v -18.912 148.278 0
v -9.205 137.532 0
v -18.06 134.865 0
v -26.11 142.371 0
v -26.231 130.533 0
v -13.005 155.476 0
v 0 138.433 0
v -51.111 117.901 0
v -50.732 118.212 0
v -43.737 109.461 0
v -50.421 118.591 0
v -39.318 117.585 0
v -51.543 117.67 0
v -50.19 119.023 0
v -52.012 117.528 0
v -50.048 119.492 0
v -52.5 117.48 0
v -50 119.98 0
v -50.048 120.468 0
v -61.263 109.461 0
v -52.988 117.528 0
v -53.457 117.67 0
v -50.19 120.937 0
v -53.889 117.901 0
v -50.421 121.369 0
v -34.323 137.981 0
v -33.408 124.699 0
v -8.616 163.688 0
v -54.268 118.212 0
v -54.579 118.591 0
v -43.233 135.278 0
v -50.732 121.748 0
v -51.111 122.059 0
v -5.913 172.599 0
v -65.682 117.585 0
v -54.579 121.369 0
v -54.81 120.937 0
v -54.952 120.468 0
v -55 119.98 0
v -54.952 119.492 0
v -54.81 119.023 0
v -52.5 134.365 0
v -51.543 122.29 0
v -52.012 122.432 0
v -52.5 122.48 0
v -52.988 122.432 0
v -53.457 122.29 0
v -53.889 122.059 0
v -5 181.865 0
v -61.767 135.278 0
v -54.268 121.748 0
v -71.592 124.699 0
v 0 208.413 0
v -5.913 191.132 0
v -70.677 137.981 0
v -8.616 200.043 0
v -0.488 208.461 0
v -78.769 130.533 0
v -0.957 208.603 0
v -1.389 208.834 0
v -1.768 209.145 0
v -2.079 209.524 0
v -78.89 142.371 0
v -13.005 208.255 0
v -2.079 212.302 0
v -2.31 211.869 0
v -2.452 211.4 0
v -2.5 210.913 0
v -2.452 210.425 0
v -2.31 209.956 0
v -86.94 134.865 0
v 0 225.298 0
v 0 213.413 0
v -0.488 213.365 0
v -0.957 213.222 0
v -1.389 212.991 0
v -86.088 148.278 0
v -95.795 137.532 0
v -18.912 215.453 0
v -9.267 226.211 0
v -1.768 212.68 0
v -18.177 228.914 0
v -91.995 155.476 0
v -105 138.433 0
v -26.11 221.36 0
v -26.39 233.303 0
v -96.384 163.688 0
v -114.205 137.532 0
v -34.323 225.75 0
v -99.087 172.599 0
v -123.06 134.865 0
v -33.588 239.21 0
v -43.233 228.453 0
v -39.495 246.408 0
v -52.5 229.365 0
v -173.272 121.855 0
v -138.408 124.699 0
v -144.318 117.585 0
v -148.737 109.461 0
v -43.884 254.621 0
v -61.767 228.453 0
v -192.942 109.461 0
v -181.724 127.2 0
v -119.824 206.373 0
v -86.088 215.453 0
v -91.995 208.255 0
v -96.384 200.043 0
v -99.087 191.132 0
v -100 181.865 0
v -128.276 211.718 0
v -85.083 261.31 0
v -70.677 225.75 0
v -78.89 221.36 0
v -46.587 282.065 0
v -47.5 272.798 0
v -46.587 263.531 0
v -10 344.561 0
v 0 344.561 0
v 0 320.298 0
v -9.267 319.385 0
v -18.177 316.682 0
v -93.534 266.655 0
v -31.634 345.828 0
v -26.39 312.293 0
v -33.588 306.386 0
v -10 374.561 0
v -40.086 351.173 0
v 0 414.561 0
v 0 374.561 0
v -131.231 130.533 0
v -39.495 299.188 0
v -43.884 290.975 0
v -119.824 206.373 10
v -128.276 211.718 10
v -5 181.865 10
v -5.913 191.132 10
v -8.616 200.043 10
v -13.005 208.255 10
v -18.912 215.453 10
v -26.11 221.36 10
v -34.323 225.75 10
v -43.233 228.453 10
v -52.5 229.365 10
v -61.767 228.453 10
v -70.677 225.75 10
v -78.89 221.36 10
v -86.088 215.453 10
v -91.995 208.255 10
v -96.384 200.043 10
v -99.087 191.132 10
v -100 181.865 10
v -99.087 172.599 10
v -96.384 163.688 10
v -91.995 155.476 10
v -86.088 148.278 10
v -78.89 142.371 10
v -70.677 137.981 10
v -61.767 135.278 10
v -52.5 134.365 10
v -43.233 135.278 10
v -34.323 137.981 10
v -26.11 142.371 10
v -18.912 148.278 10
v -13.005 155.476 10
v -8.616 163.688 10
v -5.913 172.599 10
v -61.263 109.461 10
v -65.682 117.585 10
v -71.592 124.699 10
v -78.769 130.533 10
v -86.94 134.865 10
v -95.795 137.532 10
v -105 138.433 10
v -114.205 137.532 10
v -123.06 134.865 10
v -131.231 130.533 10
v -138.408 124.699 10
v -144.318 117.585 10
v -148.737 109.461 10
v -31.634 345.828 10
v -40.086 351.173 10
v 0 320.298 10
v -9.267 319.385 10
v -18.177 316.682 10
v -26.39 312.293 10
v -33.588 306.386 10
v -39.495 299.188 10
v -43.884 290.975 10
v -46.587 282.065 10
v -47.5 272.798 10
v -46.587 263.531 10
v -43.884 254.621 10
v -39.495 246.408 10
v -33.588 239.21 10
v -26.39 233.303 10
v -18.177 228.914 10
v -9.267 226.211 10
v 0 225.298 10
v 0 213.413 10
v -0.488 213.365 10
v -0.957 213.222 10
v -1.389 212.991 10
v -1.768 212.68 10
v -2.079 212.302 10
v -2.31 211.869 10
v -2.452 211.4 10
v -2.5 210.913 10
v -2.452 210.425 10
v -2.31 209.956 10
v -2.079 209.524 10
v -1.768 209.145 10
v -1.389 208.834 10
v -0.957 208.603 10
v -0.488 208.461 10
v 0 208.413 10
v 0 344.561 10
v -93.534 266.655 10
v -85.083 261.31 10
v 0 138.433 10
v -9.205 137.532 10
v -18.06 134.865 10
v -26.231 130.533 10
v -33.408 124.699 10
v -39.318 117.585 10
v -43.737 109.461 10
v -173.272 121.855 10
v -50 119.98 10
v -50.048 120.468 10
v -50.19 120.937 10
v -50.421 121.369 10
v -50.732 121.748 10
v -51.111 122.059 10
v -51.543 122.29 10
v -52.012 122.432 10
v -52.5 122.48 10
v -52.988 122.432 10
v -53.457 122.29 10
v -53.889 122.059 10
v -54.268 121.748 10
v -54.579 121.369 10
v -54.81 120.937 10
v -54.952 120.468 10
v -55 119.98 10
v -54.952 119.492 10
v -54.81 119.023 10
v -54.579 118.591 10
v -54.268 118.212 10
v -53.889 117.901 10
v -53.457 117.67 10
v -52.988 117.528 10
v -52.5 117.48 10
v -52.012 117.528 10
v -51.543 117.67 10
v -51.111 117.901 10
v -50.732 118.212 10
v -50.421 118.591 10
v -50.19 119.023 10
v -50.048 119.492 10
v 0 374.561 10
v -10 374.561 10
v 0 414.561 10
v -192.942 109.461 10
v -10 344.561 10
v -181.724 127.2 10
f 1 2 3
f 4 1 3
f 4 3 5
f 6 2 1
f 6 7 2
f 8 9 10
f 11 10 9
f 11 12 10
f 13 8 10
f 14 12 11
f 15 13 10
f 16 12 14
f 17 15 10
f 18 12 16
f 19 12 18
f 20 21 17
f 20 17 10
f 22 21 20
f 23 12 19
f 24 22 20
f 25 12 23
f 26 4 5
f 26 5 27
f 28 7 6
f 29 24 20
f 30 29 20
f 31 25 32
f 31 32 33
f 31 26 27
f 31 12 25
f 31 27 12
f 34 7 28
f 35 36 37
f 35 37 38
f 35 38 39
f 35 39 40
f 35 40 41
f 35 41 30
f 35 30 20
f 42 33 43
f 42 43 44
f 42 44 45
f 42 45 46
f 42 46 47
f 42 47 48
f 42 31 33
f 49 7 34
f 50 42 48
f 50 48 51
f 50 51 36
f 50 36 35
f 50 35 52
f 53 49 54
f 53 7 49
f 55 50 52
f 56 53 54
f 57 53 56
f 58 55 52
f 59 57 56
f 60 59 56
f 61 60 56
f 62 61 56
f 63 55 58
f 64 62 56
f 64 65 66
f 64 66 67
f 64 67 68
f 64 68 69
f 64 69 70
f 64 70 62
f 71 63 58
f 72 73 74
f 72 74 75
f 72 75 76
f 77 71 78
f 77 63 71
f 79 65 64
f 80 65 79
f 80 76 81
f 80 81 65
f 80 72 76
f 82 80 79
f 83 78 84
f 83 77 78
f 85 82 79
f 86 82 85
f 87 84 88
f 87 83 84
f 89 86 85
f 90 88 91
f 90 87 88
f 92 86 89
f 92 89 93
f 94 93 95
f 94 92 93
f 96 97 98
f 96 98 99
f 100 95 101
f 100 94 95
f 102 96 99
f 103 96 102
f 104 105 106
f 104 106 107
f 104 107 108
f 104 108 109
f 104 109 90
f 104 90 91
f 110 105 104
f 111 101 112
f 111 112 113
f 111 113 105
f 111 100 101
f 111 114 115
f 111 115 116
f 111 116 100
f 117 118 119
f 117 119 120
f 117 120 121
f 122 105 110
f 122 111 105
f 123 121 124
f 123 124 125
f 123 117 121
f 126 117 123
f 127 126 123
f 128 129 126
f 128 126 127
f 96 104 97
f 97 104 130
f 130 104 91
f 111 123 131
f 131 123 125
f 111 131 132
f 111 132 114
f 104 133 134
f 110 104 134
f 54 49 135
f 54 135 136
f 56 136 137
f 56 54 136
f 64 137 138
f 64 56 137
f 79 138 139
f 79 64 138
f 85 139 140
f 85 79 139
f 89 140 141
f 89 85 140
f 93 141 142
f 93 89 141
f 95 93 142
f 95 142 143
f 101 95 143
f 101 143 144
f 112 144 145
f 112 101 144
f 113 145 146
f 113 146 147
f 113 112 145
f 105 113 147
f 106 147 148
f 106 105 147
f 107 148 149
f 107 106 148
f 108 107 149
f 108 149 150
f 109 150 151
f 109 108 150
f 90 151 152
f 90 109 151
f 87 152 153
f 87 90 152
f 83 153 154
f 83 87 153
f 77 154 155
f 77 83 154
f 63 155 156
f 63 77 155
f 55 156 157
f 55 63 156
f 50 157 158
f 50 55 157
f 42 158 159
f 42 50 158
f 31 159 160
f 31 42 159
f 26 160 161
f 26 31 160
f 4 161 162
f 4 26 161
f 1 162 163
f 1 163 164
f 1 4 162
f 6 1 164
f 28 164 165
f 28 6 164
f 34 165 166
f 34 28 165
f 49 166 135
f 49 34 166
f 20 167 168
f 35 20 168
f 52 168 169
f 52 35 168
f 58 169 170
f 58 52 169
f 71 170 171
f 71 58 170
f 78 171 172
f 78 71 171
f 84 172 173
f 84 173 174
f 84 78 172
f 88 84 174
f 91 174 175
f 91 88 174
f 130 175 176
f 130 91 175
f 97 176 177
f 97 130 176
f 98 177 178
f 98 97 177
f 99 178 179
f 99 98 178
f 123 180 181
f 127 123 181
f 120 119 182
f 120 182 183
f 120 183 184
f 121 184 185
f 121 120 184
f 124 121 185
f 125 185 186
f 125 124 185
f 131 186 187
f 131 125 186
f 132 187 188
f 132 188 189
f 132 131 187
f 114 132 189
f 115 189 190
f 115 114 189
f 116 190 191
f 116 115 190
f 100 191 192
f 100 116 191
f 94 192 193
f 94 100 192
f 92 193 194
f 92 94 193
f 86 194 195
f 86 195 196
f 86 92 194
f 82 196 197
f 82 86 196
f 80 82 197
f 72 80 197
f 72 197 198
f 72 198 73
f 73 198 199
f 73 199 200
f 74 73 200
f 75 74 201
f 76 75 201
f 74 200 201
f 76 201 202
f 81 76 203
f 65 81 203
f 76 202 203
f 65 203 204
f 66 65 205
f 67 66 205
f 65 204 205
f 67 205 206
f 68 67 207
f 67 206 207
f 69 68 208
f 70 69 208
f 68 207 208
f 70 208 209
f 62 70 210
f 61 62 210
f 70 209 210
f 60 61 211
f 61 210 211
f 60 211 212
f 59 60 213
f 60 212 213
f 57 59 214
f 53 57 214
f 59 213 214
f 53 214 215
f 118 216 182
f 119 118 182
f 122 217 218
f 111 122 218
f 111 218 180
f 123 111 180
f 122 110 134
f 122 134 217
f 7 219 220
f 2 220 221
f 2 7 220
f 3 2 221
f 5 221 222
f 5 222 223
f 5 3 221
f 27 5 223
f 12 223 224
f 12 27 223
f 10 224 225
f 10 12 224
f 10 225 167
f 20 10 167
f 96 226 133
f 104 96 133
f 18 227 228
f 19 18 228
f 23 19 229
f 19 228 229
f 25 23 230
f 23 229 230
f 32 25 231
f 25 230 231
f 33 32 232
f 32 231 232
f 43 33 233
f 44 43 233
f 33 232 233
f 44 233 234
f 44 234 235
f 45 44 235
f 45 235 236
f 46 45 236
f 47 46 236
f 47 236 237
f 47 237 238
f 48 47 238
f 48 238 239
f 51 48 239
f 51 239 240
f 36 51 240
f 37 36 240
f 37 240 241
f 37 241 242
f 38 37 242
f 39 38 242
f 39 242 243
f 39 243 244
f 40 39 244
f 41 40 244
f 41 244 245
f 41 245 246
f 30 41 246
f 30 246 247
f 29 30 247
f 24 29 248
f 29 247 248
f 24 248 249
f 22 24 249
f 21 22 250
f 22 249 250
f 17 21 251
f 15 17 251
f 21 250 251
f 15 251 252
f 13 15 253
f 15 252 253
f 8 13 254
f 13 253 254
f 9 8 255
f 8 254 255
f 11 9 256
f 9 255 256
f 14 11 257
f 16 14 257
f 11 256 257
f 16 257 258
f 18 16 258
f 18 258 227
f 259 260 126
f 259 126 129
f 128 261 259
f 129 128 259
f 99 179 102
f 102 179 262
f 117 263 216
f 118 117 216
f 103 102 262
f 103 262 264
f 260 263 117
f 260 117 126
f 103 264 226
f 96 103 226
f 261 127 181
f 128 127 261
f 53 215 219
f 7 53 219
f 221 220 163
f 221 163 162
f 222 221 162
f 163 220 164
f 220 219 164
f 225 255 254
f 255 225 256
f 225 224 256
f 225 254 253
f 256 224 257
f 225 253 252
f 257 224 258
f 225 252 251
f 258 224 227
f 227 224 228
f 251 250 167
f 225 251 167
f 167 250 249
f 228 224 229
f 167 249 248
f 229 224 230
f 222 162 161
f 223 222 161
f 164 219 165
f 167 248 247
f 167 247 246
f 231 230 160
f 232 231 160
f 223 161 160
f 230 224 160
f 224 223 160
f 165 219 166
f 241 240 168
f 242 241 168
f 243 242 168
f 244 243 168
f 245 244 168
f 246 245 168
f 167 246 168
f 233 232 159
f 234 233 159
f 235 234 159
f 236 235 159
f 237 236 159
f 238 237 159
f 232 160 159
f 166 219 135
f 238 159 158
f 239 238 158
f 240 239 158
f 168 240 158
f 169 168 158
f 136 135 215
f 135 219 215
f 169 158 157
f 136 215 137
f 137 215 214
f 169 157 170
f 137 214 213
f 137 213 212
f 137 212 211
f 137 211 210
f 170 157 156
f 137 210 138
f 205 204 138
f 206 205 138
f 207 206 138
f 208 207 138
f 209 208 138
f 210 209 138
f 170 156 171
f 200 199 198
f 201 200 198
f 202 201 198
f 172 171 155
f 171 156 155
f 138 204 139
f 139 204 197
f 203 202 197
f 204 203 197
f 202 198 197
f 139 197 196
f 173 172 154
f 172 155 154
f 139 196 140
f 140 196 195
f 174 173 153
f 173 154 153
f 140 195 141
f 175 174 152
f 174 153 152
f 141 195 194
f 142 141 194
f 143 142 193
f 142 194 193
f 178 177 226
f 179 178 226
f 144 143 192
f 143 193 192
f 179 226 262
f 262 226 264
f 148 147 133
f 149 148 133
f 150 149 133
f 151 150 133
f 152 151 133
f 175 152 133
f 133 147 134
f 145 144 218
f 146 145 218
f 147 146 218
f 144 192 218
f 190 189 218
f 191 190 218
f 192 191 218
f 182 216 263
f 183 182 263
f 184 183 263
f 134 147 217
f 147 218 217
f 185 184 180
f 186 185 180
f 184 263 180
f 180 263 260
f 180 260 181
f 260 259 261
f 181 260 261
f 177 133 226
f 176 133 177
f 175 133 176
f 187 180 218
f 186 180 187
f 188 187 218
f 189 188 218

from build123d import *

# Parameters (mm, degrees)
ESQUISSE1_R             = 47.5
BOSS_EXTRU_1_DEPTH      = 10
ESQUISSE3_W             = 100
ESQUISSE3_H             = 10
ENL_V_MAT_EXTRU_1_DEPTH = 11
ESQUISSE4_R             = 2.5
ENL_V_MAT_EXTRU_2_DEPTH = 11
ESQUISSE6_W             = 75
ESQUISSE6_H             = 120
BOSS_EXTRU_2_DEPTH      = 10
ESQUISSE7_W             = 10
ESQUISSE7_H             = 50
ESQUISSE7_W_2           = 30
ESQUISSE7_H_2           = 9.570800355
ENL_V_MAT_EXTRU_3_DEPTH = 10
ENL_V_MAT_EXTRU_6_DEPTH = 10
ESQUISSE12_W            = 10
ESQUISSE12_H            = 30
ENL_V_MAT_EXTRU_7_DEPTH = 10


with BuildPart() as part:
    # Esquisse1 → Boss.-Extru.1 (new body)
    with BuildSketch(Plane.XY):
        Polygon((-310, -75.642859016), (0, 414.561180135), (310, -75.642859016), align=None)
        with Locations((-157.5, 0)):
            Circle(ESQUISSE1_R, mode=Mode.SUBTRACT)
        with Locations((-52.5, 0)):
            Circle(ESQUISSE1_R, mode=Mode.SUBTRACT)
        with Locations((52.5, 0)):
            Circle(ESQUISSE1_R, mode=Mode.SUBTRACT)
        with Locations((157.5, 0)):
            Circle(ESQUISSE1_R, mode=Mode.SUBTRACT)
        with Locations((-105, 90.932667397)):
            Circle(ESQUISSE1_R, mode=Mode.SUBTRACT)
        with Locations((0, 90.932667397)):
            Circle(ESQUISSE1_R, mode=Mode.SUBTRACT)
        with Locations((105, 90.932667397)):
            Circle(ESQUISSE1_R, mode=Mode.SUBTRACT)
        with Locations((-52.5, 181.865334795)):
            Circle(ESQUISSE1_R, mode=Mode.SUBTRACT)
        with Locations((52.5, 181.865334795)):
            Circle(ESQUISSE1_R, mode=Mode.SUBTRACT)
        with Locations((0, 272.798002192)):
            Circle(ESQUISSE1_R, mode=Mode.SUBTRACT)
    extrude(amount=BOSS_EXTRU_1_DEPTH)

    # Esquisse3 → Enlèv. mat.-Extru.1 (cut, through all)
    with BuildSketch(Plane.XY.offset(10)):
        Polygon((-269.913793103, -12.254405678), (-261.461999325, -17.599233264), (-208.013723463, 66.918704521), (-216.465517241, 72.263532107), align=None)
        Polygon((-181.724137931, 127.200191667), (-173.272344153, 121.855364081), (-119.82406829, 206.373301865), (-128.275862069, 211.718129452), align=None)
        Polygon((-93.534482759, 266.654789012), (-85.08268898, 261.309961425), (-31.634413118, 345.82789921), (-40.086206897, 351.172726796), align=None)
        Polygon((269.913793103, -12.254405678), (261.461999325, -17.599233264), (208.013723463, 66.918704521), (216.465517241, 72.263532107), align=None)
        Polygon((181.724137931, 127.200191667), (173.272344153, 121.855364081), (119.82406829, 206.373301865), (128.275862069, 211.718129452), align=None)
        Polygon((93.534482759, 266.654789012), (85.08268898, 261.309961425), (31.634413118, 345.82789921), (40.086206897, 351.172726796), align=None)
        with Locations((-160, -70.642859016)):
            Rectangle(ESQUISSE3_W, ESQUISSE3_H)
        with Locations((160, -70.642859016)):
            Rectangle(ESQUISSE3_W, ESQUISSE3_H)
    extrude(amount=-ENL_V_MAT_EXTRU_1_DEPTH, mode=Mode.SUBTRACT)

    # Esquisse4 → Enlèv. mat.-Extru.2 (cut, through all)
    with BuildSketch(Plane.XY.offset(10)):
        with Locations((-157.5, -55.642859016)):
            Circle(ESQUISSE4_R)
        with Locations((-52.5, -55.642859016)):
            Circle(ESQUISSE4_R)
        with Locations((52.5, -55.642859016)):
            Circle(ESQUISSE4_R)
        with Locations((157.5, -55.642859016)):
            Circle(ESQUISSE4_R)
        with Locations((-105, 29.047375097)):
            Circle(ESQUISSE4_R)
        with Locations((0, 29.047375097)):
            Circle(ESQUISSE4_R)
        with Locations((105, 29.047375097)):
            Circle(ESQUISSE4_R)
        with Locations((-52.5, 119.980042494)):
            Circle(ESQUISSE4_R)
        with Locations((52.5, 119.980042494)):
            Circle(ESQUISSE4_R)
        with Locations((0, 210.912709891)):
            Circle(ESQUISSE4_R)
    extrude(amount=-ENL_V_MAT_EXTRU_2_DEPTH, mode=Mode.SUBTRACT)

    # Esquisse6 → Boss.-Extru.2 (add)
    with BuildSketch(Plane.XY.offset(10)):
        with Locations((0, -135.642859016)):
            Rectangle(ESQUISSE6_W, ESQUISSE6_H)
    extrude(amount=-BOSS_EXTRU_2_DEPTH)

    # Esquisse7 → Enlèv. mat.-Extru.3 (cut)
    with BuildSketch(Plane.XY.offset(10)):
        with Locations((-32.5, -135.642859016)):
            Rectangle(ESQUISSE7_W, ESQUISSE7_H)
        with Locations((1.495284743, -190.857458839)):
            Rectangle(ESQUISSE7_W_2, ESQUISSE7_H_2)
        with Locations((32.5, -135.642859016)):
            Rectangle(ESQUISSE7_W, ESQUISSE7_H)
    extrude(amount=-ENL_V_MAT_EXTRU_3_DEPTH, mode=Mode.SUBTRACT)

    # Esquisse11 → Enlèv. mat.-Extru.6 (cut)
    with BuildSketch(Plane.XY.offset(10)):
        Polygon((0, 414.561180135), (0, 109.461180135), (-346.154388362, 109.461180135), (-346.154388362, -222.549126753), (369.346533709, -222.549126753), (369.346533709, 414.561180135), align=None)
    extrude(amount=-ENL_V_MAT_EXTRU_6_DEPTH, mode=Mode.SUBTRACT)

    # Esquisse12 → Enlèv. mat.-Extru.7 (cut)
    with BuildSketch(Plane.XY.offset(10)):
        with Locations((-5, 359.561180135)):
            Rectangle(ESQUISSE12_W, ESQUISSE12_H)
    extrude(amount=-ENL_V_MAT_EXTRU_7_DEPTH, mode=Mode.SUBTRACT)


solid = part.part
